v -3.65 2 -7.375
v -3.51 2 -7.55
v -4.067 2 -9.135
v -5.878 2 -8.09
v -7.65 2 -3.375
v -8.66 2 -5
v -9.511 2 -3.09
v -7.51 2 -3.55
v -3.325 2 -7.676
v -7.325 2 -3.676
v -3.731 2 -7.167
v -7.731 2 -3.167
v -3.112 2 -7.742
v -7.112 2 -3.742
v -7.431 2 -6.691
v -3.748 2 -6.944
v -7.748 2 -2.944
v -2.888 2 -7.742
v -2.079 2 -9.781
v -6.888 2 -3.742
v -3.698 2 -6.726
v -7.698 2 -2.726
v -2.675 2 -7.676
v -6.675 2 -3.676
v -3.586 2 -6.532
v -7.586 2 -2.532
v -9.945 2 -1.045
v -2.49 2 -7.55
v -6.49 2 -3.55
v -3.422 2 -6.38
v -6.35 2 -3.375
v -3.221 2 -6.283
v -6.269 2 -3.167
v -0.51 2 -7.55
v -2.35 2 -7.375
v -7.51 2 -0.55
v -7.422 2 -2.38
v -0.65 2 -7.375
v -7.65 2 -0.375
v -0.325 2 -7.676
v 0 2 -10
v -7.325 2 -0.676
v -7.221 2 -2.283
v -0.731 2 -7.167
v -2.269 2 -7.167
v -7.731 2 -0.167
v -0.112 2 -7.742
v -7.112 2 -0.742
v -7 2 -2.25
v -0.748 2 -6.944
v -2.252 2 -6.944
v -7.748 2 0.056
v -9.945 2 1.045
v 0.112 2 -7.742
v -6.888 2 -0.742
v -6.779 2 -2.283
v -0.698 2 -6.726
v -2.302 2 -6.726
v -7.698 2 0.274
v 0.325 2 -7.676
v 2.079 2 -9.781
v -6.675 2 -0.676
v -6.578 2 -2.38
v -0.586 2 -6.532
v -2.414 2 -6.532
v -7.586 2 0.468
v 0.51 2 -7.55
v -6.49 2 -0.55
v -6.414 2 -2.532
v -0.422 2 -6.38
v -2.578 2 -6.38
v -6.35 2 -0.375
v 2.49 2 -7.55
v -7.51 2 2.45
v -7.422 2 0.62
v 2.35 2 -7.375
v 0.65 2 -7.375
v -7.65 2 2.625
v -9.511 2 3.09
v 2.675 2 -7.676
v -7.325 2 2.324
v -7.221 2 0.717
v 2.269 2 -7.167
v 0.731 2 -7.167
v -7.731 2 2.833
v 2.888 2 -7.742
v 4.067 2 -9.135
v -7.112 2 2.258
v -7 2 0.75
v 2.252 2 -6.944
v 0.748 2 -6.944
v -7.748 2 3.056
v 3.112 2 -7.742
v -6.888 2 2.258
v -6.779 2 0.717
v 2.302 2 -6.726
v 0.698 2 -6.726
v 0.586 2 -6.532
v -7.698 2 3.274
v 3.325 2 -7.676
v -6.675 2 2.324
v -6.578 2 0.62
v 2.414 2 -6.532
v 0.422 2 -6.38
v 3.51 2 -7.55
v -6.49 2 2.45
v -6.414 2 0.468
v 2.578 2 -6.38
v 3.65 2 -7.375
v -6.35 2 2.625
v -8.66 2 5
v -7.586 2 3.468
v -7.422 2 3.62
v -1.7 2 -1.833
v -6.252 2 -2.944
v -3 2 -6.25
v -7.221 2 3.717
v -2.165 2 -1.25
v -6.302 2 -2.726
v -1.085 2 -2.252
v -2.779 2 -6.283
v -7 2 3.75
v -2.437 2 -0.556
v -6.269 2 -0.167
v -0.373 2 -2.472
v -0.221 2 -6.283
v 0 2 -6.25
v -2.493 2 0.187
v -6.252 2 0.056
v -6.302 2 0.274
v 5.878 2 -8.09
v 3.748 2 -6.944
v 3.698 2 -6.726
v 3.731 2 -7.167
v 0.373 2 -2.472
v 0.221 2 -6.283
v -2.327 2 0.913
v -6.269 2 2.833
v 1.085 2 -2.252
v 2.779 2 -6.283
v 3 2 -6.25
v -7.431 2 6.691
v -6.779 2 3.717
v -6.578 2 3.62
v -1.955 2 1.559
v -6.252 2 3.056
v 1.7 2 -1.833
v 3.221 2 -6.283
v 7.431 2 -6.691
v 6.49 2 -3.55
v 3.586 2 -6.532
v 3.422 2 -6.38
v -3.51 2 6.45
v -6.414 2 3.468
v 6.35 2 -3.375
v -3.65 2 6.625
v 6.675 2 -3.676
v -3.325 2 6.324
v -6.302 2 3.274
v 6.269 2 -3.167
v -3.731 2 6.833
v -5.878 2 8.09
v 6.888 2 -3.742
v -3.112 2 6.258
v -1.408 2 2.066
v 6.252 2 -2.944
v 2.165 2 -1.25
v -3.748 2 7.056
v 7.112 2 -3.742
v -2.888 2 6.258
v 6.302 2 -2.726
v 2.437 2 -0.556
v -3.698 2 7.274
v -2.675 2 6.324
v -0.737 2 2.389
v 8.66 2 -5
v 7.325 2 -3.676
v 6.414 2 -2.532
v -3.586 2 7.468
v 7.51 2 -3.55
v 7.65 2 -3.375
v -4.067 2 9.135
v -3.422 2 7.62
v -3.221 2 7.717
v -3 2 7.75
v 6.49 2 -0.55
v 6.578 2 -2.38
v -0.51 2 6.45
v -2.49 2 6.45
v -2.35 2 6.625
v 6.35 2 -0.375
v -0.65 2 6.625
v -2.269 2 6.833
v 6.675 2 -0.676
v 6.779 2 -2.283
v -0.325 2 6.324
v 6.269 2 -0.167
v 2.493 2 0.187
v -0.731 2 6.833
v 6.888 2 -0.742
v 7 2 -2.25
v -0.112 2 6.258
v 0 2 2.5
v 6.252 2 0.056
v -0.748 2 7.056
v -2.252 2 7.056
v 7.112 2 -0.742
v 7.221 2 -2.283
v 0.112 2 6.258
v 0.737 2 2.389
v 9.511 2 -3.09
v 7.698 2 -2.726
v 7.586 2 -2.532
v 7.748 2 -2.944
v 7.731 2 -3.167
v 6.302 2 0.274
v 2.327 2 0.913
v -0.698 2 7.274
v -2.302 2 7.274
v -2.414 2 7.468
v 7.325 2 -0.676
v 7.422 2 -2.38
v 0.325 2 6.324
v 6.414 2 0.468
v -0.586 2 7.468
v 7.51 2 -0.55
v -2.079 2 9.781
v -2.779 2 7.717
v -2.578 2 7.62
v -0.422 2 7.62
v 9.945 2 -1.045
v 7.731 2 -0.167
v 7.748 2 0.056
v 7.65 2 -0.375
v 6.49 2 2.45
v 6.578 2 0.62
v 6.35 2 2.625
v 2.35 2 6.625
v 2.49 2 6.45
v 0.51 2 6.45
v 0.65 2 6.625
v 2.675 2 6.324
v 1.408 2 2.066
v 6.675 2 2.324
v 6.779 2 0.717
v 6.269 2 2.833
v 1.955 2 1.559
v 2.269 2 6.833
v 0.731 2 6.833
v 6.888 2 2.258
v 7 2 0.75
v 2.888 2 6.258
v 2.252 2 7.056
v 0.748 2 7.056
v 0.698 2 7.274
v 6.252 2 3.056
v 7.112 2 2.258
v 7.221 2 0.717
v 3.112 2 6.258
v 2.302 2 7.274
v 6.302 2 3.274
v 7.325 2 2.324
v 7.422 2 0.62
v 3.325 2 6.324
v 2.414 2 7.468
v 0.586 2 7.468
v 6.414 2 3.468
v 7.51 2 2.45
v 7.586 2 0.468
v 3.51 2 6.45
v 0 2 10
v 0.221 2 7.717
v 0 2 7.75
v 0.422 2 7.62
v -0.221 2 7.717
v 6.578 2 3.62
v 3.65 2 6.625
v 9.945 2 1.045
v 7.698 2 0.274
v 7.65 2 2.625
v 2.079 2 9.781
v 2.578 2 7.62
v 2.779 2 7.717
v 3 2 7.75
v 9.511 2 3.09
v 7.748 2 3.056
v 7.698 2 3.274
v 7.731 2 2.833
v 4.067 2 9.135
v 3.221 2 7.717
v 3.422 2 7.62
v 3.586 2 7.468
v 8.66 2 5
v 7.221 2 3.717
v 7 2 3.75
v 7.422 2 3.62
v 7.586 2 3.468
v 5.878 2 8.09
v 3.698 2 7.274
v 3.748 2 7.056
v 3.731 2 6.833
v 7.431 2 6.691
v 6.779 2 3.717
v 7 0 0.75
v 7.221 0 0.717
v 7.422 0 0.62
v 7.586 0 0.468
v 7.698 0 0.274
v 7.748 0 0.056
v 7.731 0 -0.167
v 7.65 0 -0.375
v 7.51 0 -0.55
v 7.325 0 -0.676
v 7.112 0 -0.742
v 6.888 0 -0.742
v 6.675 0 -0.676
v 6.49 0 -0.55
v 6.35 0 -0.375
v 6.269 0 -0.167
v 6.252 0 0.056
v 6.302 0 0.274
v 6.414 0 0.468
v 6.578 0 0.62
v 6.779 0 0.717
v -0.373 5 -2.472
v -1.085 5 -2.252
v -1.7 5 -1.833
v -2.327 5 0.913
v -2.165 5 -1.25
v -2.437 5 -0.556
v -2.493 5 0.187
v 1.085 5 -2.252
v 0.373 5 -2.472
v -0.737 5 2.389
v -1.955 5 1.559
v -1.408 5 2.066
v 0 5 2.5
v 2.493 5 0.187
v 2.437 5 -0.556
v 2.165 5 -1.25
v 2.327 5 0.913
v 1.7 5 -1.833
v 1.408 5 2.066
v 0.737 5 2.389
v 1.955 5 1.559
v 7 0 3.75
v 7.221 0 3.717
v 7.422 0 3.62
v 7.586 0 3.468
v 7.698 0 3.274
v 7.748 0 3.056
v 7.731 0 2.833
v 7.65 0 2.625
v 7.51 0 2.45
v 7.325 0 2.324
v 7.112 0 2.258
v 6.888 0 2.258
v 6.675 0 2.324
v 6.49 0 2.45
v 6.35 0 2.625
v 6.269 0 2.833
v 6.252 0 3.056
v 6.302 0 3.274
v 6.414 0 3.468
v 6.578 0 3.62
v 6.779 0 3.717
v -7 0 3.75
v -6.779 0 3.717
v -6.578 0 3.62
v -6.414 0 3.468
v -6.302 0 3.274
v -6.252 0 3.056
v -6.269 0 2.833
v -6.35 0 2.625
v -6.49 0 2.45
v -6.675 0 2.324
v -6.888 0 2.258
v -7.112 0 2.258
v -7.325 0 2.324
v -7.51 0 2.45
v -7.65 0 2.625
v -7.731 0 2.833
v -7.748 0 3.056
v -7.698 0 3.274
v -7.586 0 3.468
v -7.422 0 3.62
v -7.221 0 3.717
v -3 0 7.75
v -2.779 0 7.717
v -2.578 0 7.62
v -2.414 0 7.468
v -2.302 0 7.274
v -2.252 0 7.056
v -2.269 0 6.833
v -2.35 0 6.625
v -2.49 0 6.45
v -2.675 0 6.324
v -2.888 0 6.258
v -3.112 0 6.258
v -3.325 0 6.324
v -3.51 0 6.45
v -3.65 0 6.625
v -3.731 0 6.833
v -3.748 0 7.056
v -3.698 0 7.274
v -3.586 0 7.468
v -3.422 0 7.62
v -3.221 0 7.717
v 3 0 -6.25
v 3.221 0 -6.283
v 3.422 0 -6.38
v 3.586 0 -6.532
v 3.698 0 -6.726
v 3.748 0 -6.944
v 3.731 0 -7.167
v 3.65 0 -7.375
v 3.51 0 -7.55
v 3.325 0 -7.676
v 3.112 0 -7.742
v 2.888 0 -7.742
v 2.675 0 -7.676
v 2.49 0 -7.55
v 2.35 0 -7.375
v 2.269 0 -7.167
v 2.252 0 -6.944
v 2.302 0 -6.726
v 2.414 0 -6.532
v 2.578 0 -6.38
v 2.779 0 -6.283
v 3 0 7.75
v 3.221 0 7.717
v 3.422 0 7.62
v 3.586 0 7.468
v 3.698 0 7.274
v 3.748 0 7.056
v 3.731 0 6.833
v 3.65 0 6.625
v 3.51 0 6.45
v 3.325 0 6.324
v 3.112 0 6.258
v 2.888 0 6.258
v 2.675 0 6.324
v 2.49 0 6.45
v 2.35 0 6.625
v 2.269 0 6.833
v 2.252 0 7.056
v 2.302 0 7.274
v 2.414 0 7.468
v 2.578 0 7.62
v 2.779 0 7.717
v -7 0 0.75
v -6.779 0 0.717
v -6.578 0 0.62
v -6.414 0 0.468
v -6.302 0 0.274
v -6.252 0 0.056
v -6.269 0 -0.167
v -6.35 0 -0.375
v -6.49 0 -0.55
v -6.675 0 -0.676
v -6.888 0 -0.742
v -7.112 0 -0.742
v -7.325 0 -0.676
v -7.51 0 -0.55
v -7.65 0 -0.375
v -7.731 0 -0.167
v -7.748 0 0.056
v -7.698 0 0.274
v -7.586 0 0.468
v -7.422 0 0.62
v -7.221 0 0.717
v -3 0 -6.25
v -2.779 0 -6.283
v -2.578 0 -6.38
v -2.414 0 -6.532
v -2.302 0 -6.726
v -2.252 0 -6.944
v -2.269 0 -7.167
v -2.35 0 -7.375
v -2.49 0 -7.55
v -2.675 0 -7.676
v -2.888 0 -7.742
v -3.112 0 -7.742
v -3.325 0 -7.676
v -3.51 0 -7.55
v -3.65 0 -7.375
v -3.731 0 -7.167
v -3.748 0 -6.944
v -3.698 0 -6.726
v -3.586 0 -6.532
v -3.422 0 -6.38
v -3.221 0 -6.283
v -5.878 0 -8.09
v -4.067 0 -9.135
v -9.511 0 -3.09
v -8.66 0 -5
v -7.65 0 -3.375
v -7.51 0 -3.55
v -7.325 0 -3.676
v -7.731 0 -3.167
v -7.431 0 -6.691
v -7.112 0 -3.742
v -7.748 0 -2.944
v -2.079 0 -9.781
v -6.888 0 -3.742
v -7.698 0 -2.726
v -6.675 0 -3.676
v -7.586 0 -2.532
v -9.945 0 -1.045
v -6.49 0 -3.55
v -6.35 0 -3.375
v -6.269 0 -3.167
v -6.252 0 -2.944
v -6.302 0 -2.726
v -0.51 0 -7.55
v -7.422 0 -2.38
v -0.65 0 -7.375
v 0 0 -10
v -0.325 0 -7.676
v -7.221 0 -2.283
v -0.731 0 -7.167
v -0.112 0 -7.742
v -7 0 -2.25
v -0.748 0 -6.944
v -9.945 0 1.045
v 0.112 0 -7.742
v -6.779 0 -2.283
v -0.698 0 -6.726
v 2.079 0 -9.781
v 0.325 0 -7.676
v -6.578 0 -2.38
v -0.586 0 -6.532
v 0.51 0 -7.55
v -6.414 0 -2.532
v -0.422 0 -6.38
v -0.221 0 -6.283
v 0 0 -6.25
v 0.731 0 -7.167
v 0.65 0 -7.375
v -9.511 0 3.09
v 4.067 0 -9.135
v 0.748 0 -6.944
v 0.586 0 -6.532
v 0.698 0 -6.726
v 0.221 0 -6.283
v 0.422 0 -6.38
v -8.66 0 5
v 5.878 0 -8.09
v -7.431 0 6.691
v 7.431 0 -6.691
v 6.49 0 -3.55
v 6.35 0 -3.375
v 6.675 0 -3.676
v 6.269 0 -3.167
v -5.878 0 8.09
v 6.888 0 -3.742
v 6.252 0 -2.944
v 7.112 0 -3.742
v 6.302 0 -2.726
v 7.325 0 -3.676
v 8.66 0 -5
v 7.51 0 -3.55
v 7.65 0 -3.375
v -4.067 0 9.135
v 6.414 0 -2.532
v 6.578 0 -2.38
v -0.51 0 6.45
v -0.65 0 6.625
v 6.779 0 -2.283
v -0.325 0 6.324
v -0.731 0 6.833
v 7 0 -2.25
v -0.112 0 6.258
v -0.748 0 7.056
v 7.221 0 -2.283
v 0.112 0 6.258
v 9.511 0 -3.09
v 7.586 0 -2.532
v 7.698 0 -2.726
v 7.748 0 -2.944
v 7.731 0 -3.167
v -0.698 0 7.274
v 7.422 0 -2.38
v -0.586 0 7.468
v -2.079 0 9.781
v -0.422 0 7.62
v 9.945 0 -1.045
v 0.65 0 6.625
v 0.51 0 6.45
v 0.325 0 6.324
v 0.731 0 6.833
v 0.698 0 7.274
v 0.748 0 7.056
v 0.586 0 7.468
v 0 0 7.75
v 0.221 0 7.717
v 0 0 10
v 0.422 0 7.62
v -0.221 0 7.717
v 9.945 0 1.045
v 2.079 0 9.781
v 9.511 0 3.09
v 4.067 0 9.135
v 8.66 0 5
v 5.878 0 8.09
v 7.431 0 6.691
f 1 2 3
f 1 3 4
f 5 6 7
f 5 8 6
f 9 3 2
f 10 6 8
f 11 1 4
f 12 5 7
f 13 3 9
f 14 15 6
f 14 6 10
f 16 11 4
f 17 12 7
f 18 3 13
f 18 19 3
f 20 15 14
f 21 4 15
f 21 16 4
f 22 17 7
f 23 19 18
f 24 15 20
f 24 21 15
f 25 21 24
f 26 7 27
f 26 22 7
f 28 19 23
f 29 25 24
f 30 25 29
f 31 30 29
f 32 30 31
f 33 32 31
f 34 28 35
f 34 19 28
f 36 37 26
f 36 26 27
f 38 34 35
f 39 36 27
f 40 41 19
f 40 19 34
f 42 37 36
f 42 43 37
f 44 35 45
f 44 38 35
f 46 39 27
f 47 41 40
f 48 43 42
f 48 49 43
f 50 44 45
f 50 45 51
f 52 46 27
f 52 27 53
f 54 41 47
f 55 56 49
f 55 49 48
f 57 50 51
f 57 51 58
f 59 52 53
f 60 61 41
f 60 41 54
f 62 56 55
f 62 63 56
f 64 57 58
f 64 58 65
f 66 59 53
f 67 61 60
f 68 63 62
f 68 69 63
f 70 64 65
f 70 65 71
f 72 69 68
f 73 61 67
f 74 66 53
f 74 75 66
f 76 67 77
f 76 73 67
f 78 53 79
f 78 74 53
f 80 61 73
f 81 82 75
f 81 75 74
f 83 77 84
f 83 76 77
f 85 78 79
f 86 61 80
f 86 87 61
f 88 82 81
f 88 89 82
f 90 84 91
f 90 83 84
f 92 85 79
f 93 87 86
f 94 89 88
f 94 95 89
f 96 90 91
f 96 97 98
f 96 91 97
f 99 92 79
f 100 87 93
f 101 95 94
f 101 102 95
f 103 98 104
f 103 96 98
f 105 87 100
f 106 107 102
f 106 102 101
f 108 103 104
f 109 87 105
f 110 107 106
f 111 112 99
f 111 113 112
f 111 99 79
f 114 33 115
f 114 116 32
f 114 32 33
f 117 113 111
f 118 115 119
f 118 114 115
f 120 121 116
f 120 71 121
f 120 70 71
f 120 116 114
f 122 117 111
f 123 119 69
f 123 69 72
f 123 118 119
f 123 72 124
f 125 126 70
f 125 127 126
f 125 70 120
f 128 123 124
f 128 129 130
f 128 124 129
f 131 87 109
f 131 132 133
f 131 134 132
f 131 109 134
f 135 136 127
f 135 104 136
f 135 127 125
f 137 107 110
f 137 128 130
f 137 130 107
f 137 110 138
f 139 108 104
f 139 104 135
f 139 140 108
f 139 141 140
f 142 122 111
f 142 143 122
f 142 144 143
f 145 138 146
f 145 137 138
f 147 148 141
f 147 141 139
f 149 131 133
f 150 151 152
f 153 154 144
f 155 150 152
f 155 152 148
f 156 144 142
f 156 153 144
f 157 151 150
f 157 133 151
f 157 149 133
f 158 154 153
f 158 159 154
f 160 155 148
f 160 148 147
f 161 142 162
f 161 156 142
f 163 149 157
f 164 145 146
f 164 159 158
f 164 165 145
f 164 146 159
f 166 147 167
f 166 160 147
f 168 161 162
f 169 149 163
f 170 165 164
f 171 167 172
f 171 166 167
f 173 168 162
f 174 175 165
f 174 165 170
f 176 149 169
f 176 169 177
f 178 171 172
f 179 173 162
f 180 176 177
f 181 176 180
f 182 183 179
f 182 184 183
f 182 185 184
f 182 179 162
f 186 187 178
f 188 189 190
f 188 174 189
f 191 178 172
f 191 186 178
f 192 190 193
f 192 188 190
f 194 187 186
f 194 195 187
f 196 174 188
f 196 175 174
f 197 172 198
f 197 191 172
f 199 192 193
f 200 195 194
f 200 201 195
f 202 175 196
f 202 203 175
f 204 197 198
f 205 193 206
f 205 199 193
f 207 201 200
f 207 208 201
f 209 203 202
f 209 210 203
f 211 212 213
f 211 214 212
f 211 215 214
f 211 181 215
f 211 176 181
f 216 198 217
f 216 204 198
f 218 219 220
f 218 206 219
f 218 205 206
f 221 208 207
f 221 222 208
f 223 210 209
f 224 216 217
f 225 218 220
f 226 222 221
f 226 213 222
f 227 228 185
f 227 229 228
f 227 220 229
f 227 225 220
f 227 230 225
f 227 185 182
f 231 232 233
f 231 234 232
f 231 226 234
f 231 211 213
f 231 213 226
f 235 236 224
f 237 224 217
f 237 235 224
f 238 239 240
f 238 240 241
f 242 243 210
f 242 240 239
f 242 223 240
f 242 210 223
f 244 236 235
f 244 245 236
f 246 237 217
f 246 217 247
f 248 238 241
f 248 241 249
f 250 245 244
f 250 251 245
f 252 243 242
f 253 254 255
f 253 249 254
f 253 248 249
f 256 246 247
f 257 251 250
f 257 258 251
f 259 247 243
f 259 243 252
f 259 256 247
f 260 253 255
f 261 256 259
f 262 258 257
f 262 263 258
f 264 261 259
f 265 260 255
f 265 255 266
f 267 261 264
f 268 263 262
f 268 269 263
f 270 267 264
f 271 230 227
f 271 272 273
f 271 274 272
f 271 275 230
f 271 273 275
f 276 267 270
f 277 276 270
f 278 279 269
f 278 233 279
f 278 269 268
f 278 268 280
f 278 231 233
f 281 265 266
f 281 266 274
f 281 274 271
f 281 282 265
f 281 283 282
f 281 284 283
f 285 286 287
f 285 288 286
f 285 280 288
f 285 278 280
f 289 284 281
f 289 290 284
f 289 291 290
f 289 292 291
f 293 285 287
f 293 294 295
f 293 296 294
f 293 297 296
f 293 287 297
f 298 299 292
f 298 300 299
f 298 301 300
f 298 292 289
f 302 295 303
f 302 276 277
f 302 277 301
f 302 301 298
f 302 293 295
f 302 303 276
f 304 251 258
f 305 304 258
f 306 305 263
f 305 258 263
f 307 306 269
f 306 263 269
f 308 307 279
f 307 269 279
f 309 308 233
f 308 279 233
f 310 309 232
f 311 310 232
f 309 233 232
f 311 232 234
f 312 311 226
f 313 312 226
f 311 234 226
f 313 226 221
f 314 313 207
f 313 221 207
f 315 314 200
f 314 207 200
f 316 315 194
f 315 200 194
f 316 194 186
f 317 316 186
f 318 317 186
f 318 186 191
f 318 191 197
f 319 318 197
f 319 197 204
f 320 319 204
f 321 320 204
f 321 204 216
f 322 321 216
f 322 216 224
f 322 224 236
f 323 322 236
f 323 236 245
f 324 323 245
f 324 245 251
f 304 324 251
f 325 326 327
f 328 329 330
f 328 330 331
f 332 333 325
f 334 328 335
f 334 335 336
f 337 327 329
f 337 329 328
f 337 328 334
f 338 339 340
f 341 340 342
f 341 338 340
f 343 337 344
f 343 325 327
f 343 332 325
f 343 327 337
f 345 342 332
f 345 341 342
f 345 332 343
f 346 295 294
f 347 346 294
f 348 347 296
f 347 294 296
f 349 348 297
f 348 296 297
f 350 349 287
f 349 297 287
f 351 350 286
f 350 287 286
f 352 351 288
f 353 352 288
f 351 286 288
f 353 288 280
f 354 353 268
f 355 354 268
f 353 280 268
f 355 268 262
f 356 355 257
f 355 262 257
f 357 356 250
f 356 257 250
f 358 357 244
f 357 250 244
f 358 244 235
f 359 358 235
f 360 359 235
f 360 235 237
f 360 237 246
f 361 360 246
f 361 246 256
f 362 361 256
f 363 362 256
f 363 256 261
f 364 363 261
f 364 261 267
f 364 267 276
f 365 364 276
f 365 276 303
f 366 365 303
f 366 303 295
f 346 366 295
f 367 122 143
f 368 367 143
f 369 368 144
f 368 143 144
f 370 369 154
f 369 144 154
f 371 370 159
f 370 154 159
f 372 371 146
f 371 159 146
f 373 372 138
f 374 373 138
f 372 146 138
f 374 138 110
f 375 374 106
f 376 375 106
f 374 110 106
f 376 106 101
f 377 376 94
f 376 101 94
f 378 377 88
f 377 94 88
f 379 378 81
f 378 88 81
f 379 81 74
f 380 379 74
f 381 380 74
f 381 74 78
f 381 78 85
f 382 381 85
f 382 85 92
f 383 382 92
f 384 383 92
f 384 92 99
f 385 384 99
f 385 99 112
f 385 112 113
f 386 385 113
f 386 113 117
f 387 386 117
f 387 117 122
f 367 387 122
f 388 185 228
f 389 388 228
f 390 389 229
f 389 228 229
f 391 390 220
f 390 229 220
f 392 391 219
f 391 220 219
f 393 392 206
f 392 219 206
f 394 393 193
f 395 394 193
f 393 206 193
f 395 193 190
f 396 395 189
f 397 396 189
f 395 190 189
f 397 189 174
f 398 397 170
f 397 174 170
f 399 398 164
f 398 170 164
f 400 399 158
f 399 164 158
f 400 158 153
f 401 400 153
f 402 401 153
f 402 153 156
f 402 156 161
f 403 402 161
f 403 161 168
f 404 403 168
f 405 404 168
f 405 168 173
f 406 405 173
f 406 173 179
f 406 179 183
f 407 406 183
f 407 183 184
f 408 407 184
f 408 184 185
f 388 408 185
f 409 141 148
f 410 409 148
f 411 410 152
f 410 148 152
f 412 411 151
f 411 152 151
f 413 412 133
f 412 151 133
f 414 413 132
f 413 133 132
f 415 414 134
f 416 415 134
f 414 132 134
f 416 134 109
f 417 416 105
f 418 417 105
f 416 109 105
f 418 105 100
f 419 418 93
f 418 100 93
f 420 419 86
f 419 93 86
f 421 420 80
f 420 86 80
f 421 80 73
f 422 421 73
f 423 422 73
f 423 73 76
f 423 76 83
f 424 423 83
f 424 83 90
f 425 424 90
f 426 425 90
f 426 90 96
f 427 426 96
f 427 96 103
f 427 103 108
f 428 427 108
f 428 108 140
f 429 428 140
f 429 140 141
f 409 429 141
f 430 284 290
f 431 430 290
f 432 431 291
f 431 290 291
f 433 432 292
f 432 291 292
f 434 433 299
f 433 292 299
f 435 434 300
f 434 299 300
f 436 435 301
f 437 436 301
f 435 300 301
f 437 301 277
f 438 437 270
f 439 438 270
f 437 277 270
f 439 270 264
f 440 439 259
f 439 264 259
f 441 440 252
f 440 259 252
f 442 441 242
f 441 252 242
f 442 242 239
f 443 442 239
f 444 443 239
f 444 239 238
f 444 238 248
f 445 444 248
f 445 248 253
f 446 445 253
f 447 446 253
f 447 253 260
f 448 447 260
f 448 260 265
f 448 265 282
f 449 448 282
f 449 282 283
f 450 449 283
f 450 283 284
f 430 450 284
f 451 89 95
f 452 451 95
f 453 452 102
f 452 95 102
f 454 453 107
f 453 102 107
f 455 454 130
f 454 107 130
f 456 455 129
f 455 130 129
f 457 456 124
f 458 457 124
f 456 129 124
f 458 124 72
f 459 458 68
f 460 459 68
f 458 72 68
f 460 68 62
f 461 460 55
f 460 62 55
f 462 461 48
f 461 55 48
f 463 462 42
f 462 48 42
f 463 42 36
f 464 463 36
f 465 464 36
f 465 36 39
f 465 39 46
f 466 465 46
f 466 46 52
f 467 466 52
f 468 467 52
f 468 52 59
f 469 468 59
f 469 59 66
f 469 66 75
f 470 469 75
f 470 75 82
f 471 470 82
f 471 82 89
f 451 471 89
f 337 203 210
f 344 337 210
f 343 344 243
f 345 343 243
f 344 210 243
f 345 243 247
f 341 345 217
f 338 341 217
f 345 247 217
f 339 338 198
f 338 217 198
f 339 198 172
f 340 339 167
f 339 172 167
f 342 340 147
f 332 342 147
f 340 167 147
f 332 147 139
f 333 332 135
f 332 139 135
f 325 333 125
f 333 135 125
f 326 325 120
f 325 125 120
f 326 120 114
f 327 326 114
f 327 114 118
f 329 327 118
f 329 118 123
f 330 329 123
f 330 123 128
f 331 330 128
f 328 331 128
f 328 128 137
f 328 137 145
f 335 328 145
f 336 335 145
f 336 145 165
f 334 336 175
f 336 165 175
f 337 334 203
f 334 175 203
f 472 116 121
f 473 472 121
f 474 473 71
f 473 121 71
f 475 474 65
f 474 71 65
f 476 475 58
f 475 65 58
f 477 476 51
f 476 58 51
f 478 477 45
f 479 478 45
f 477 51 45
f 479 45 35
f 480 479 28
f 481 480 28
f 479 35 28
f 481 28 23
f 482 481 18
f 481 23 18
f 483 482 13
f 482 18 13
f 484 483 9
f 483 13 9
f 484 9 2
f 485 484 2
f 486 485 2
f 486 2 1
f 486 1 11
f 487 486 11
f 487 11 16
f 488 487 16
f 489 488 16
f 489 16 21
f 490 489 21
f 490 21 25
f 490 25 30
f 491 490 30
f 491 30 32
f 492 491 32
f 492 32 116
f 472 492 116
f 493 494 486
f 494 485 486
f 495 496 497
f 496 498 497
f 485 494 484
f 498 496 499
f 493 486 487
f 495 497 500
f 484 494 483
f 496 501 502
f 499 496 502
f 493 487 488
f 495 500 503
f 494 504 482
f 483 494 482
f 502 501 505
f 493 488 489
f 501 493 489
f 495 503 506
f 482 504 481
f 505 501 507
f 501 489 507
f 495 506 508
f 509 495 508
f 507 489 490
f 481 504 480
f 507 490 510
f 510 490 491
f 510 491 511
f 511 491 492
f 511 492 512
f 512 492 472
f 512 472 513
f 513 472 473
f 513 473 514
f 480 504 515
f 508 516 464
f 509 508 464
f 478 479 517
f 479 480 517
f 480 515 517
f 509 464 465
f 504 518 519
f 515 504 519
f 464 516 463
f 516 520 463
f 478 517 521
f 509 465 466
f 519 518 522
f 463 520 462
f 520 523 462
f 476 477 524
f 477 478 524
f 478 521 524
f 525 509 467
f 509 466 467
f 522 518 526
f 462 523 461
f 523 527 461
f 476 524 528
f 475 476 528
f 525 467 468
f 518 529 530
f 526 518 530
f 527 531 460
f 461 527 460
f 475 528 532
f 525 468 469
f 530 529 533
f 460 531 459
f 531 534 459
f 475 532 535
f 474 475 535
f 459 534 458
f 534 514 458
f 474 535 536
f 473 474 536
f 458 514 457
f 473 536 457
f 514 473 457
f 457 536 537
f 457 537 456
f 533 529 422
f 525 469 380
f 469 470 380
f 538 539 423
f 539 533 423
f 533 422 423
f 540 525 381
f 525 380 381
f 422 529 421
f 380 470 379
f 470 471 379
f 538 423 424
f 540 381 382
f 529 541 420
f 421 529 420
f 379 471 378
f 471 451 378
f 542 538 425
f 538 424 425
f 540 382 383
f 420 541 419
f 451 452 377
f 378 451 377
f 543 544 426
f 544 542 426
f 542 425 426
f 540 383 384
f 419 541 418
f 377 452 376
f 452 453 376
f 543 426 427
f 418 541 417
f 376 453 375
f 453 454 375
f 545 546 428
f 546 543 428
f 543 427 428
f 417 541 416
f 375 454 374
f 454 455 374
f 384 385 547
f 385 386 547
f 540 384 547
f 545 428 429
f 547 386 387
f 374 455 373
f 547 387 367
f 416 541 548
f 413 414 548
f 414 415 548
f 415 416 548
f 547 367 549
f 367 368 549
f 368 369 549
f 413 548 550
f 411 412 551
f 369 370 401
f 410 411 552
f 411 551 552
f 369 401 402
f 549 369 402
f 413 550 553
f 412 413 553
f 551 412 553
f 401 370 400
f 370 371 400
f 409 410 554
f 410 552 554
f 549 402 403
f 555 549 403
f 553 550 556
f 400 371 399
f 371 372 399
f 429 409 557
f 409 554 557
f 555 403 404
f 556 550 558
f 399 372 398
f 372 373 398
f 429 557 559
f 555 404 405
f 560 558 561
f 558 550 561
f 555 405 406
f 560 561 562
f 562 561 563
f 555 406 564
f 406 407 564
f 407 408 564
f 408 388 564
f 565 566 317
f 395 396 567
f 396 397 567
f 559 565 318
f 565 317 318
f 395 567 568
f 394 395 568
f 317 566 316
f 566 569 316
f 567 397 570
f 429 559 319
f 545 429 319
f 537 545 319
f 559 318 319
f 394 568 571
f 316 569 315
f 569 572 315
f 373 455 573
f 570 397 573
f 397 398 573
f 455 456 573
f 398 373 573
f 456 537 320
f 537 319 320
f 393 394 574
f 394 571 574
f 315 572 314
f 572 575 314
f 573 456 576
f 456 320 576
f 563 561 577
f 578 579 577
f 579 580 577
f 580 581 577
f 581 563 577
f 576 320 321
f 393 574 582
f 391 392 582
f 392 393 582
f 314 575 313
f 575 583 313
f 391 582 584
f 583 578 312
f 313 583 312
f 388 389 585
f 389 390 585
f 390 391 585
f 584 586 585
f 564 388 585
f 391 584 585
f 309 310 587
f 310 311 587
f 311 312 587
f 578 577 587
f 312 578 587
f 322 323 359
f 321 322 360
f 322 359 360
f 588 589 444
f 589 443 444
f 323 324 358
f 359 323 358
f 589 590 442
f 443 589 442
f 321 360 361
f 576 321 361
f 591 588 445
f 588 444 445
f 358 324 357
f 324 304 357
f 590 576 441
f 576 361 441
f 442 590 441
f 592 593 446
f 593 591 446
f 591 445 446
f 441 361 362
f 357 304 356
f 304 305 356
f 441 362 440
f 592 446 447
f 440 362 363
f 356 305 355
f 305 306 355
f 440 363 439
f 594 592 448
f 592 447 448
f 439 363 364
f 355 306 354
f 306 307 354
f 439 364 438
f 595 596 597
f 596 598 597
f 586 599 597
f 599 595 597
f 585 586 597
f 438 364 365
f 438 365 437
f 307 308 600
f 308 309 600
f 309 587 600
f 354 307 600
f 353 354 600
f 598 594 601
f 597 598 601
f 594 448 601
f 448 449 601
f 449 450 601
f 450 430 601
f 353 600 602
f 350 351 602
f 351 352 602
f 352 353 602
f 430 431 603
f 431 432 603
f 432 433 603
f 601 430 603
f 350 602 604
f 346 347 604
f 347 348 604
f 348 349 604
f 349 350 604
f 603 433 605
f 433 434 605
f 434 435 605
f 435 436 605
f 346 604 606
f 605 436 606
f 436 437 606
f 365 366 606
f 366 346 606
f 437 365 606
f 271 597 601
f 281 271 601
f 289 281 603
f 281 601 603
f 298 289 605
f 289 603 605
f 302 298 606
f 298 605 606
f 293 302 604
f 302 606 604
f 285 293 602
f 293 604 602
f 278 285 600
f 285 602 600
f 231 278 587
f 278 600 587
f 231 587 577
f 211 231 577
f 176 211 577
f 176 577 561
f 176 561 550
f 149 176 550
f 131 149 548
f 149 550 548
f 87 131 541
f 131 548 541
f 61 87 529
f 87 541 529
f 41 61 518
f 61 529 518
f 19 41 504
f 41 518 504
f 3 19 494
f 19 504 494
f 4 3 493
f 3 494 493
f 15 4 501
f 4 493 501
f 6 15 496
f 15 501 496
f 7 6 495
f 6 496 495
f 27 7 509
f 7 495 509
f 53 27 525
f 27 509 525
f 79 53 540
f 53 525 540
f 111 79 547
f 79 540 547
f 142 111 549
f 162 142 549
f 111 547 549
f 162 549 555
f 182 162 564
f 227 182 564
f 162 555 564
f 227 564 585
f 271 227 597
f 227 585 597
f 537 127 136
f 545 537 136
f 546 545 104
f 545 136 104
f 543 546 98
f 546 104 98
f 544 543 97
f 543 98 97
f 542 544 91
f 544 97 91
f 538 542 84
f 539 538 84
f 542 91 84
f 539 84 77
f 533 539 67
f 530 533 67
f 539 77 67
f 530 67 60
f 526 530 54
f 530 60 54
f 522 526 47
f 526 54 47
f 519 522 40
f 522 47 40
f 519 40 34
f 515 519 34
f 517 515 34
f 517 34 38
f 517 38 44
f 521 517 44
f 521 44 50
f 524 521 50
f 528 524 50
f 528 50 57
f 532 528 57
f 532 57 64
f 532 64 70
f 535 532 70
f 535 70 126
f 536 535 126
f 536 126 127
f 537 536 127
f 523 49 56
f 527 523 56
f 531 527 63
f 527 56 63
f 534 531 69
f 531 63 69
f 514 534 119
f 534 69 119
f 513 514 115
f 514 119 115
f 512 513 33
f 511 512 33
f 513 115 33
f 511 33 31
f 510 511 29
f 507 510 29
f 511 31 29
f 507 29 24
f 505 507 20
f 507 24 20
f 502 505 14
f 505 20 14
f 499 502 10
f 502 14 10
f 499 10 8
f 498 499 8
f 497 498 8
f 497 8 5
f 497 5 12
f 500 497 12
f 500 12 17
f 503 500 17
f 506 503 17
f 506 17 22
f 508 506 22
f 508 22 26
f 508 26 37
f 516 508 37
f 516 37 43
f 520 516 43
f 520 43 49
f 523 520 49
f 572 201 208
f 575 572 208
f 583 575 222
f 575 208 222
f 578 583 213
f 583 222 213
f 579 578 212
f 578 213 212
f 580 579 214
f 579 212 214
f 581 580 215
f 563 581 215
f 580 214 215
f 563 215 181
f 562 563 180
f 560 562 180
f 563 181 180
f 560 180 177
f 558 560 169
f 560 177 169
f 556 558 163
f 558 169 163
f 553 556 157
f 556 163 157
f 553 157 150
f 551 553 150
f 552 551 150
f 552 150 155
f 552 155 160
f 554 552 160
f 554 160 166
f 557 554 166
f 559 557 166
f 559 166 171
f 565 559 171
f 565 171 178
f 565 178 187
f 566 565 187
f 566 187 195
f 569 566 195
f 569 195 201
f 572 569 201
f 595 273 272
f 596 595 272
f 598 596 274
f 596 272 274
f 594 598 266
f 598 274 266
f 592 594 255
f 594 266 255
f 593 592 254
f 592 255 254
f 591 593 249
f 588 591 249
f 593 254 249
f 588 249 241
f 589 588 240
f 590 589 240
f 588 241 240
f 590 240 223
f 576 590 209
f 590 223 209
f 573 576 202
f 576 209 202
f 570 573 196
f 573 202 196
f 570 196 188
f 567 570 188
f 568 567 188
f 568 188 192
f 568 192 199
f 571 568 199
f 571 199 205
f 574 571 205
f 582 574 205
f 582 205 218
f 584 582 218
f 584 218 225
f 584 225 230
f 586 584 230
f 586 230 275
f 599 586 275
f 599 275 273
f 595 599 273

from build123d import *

# Parameters (mm, degrees)
SKETCH_1_R          = 10
EXTRUDE_1_DEPTH     = 2
SKETCH_2_R          = 2.5
EXTRUDE_2_DEPTH     = 3
SKETCH_3_R          = 0.75
CUT_EXTRUDE_1_DEPTH = 15.456832295


with BuildPart() as part:
    # 草图1 → 凸台-拉伸1 (new body)
    with BuildSketch(Plane(origin=(0, 0, 0), x_dir=(1, 0, 0), z_dir=(0, 1, 0))):
        with Locations(Location((0, 0, 0), (0, 0, 270))):
            Circle(SKETCH_1_R)
    extrude(amount=EXTRUDE_1_DEPTH)

    # 草图2 → 凸台-拉伸2 (add)
    with BuildSketch(Plane(origin=(0, 2, 0), x_dir=(1, 0, 0), z_dir=(0, 1, 0))):
        with Locations(Location((0, 0, 0), (0, 0, 270))):
            Circle(SKETCH_2_R)
    extrude(amount=EXTRUDE_2_DEPTH)

    # 草图3 → 切除-拉伸1 (cut, through all)
    with BuildSketch(Plane(origin=(0, 2, 0), x_dir=(1, 0, 0), z_dir=(0, 1, 0))):
        with Locations(Location((0, 7, 0), (0, 0, 270))):
            Circle(SKETCH_3_R)
        with Locations(Location((-3, 7, 0), (0, 0, 270))):
            Circle(SKETCH_3_R)
        with Locations(Location((3, 7, 0), (0, 0, 270))):
            Circle(SKETCH_3_R)
        with Locations(Location((7, 3, 0), (0, 0, 270))):
            Circle(SKETCH_3_R)
        with Locations(Location((7, 0, 0), (0, 0, 270))):
            Circle(SKETCH_3_R)
        with Locations(Location((7, -3, 0), (0, 0, 270))):
            Circle(SKETCH_3_R)
        with Locations(Location((3, -7, 0), (0, 0, 270))):
            Circle(SKETCH_3_R)
        with Locations(Location((0, -7, 0), (0, 0, 270))):
            Circle(SKETCH_3_R)
        with Locations(Location((-3, -7, 0), (0, 0, 270))):
            Circle(SKETCH_3_R)
        with Locations(Location((-7, -3, 0), (0, 0, 270))):
            Circle(SKETCH_3_R)
        with Locations(Location((-7, 0, 0), (0, 0, 270))):
            Circle(SKETCH_3_R)
        with Locations(Location((-7, 3, 0), (0, 0, 270))):
            Circle(SKETCH_3_R)
    extrude(amount=-CUT_EXTRUDE_1_DEPTH, mode=Mode.SUBTRACT)


solid = part.part
